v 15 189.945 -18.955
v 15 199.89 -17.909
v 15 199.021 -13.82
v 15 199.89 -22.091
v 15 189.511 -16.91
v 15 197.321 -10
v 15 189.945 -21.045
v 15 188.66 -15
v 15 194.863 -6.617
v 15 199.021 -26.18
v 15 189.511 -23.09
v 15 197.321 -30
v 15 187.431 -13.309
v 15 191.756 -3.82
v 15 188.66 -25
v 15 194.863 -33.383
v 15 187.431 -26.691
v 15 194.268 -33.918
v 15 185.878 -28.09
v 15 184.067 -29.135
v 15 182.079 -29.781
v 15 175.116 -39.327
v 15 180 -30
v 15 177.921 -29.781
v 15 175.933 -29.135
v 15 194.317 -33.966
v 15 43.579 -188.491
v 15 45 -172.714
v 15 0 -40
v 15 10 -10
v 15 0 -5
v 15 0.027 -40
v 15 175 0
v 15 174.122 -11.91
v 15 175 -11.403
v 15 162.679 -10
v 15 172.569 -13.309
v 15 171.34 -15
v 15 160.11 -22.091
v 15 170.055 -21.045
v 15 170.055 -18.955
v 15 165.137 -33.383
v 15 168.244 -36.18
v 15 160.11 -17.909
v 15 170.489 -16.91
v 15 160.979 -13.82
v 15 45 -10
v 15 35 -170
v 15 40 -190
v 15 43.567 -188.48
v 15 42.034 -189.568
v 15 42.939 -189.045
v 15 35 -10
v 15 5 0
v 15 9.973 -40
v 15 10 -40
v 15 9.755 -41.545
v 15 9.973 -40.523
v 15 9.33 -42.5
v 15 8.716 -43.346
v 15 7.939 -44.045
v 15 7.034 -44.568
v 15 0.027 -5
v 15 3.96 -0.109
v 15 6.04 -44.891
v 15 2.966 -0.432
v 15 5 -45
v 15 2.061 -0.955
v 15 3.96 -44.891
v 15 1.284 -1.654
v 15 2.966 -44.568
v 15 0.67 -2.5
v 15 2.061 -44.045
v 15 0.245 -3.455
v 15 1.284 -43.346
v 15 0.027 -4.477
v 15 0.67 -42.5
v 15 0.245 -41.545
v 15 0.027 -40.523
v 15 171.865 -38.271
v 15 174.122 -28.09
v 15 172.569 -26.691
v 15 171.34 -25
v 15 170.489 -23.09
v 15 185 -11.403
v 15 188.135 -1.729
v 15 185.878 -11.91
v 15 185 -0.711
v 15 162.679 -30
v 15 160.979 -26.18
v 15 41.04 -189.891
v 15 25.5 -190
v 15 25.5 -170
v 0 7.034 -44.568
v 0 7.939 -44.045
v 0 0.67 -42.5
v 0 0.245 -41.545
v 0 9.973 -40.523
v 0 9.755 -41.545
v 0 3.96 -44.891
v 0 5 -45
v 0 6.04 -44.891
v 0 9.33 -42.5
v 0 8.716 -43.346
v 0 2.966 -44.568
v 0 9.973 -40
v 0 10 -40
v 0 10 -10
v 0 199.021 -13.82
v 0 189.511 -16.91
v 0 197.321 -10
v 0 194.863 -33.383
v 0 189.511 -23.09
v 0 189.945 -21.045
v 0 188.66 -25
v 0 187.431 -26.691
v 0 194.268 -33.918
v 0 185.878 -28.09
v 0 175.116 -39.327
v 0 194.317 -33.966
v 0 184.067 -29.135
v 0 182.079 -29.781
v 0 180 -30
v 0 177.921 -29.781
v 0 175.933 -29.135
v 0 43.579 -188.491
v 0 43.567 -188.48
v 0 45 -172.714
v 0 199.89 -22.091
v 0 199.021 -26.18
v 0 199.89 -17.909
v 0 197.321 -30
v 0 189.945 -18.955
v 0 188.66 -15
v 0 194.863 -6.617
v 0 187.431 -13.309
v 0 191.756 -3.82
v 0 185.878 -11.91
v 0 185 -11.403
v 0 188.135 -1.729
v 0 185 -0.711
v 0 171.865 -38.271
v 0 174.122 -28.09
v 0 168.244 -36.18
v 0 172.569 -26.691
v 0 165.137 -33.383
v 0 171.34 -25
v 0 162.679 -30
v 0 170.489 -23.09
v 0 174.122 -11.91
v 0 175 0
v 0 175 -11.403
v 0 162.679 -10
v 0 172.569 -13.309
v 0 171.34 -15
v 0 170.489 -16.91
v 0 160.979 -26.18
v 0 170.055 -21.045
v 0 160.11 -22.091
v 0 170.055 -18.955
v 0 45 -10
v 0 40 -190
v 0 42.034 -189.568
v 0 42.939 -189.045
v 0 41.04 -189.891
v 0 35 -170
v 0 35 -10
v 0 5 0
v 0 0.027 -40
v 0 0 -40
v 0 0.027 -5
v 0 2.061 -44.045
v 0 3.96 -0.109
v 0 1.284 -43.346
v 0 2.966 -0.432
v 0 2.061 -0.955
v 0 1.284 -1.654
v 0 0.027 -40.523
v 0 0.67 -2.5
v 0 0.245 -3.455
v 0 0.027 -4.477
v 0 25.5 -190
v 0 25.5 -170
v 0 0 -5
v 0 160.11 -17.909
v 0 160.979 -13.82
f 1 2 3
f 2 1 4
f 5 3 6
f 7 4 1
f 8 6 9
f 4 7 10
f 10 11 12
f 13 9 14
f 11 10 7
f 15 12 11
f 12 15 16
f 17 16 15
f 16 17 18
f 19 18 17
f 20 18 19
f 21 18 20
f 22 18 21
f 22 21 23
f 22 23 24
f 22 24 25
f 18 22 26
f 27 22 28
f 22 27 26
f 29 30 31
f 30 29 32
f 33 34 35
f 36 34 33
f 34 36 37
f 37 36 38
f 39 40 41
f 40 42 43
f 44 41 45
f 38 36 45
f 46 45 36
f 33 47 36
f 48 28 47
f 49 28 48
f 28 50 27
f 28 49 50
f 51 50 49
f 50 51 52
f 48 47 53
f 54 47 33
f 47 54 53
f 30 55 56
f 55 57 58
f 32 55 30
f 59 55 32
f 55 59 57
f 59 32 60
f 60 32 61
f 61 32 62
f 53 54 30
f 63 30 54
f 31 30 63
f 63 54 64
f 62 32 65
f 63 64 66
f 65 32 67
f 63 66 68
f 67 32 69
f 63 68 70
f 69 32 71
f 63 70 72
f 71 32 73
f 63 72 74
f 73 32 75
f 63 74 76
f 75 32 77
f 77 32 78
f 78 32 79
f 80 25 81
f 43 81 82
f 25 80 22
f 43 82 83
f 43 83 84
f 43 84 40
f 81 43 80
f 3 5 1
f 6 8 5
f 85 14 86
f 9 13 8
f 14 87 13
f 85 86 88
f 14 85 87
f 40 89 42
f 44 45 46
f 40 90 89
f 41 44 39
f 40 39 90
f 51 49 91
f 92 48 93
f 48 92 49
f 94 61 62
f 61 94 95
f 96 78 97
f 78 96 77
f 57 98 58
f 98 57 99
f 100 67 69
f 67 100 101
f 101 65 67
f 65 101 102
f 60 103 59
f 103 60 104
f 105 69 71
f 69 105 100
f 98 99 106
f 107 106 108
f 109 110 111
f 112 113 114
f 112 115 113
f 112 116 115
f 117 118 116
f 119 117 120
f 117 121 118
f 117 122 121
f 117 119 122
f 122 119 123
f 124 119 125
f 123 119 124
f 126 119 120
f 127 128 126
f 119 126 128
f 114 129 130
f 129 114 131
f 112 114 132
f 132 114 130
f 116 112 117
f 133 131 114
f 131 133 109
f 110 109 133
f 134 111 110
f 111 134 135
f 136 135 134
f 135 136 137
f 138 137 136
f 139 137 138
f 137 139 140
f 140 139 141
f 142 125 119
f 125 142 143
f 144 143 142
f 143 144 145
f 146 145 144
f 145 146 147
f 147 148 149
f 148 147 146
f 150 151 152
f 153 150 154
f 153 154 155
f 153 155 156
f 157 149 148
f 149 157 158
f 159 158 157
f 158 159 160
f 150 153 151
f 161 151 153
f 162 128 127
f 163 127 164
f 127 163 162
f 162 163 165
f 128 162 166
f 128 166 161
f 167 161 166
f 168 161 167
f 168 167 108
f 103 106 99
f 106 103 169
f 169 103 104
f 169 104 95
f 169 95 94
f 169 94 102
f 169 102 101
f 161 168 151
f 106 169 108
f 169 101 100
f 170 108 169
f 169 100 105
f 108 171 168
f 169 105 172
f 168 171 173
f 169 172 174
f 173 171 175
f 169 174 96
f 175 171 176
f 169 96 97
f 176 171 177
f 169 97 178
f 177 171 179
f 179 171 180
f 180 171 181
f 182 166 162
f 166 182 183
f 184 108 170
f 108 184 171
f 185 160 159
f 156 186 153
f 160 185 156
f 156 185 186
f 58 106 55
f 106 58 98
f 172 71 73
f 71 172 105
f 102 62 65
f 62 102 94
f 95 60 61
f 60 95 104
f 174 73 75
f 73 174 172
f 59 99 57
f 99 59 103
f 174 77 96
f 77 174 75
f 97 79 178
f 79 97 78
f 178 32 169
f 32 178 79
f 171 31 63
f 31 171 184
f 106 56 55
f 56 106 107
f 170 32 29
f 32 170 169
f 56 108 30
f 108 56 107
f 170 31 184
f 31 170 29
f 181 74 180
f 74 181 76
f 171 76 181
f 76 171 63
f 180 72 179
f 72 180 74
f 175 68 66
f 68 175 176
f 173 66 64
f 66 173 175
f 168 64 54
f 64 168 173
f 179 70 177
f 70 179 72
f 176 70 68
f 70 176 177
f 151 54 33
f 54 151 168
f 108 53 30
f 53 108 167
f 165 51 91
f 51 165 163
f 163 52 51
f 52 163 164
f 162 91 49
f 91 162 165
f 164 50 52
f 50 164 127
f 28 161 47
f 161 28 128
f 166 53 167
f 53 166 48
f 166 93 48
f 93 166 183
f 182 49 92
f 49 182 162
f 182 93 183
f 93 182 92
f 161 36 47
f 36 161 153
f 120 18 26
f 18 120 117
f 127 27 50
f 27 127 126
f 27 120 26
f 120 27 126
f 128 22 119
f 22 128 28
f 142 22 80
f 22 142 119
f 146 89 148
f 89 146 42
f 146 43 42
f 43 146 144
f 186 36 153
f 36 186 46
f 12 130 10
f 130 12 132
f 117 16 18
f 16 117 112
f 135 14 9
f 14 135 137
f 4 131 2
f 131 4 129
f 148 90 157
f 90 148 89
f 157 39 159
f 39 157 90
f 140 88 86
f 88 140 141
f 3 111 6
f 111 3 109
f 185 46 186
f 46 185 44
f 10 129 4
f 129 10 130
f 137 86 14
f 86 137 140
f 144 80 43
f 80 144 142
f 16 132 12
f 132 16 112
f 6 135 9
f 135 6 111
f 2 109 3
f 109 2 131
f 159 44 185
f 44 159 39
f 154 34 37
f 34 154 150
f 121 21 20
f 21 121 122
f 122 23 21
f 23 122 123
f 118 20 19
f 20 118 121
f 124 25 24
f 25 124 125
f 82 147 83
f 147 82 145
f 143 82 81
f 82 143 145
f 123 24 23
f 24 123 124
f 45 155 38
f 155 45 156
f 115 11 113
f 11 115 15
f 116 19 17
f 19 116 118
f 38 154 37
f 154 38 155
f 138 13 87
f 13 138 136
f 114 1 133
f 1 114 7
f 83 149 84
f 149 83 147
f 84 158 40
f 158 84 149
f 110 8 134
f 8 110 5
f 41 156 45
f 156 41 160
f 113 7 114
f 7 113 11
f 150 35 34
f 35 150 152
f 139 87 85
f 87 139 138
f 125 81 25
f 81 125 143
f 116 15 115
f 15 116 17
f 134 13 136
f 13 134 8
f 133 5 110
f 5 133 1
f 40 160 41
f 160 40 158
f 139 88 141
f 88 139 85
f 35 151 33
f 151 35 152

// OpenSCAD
/* Customisable hook */

//preview[view:east, tilt:top diagonal]

/* All lengths in millimetres */

// Length of horizontal arm from vertical support to the centre of the holder
arm_length = 140;

// Length of vertical support
support_length = 180;

// Diameter of holder
holder_diameter = 40;

// Cut a section out of the hook?
create_cutout = "Yes"; // [Yes, No]

// Inside measurement along the top of the hook
hook_inside_top_length = 25;

// Inside measurement down the back of the hook
hook_inside_back_length = 25;

// Length of standoff to hold support from wall (set to 0 if not needed)
standoff_length = 9.5;

// Height of standoff
standoff_height = 20;

// Horizontal size - thicker is more sturdy
thickness = 15;

// Bulk - bulkier is more sturdy
bulk = 10;

// Smoothness
smoothness = 30; // [30: Rough, 60: Okay, 120: Good, 180: Very good]
$fn = smoothness;

/* Calculated values */

holder_radius = holder_diameter / 2;

holder_inside_radius = holder_radius - bulk;

hook_top_length = hook_inside_top_length + bulk;
hook_back_length = hook_inside_back_length + bulk;

triangle_length = sqrt(pow(sqrt(pow(arm_length,2)+pow(support_length-(holder_radius- bulk/2),2)),2)-pow((holder_radius- bulk/2),2));

triangle_angle = atan(arm_length/(support_length-(holder_radius- bulk/2)))+ atan((holder_radius-bulk/2)/triangle_length);

create_hook();

module create_hook() {
    translate([0,hook_back_length+bulk/2,0-bulk/2])
        difference() {
            union() {
                back_hook();
                structure();
                holder();
            }
            if (create_cutout == "Yes") {
                cutout();
            }
        }
}

module back_hook() {
    /* Hook */
    /* Back of hook */
    translate([0,0-hook_top_length,0])
        union() {
            translate([0,0,0-hook_back_length])
                rotate([0,90,0])
                    cylinder(h = thickness, r = bulk/2);
            translate([0,0-bulk/2,0-hook_back_length])
                cube([thickness, bulk, hook_back_length]);
        }      
    /* Top of hook */
    translate([0,0-hook_top_length,0])
        union() {
            translate([0,0,0])
                rotate([0,90,0])
                    cylinder(h = thickness, r = bulk/2);
            translate([0,0,0-bulk/2])
                cube([thickness, hook_top_length, bulk]);
        }    
}


module structure() {
    /* Vertical support */
    translate([0,0,0-support_length])
        union() {
            translate([0,0,0])
                rotate([0,90,0])
                    cylinder(h = thickness, r = bulk/2);
            translate([0,0-bulk/2,0])
                cube([thickness, bulk, support_length]);
        }

    /* Standoff */
    translate([0,0-standoff_length-bulk/2,0-support_length-bulk/2])    
        cube([thickness, standoff_length+bulk/2, standoff_height]);

    /* Arm */
    translate([0,0,0-bulk/2])
        cube([thickness, arm_length, bulk]);
        
    /* Triangle */
    translate([0,0,0-support_length])
        rotate([0-triangle_angle,0,0])
            translate([0,0-bulk/2,0])
                cube([thickness, bulk, triangle_length]);    
}

module holder() {
    translate([0,arm_length,0-holder_radius+bulk/2])
        rotate([0,90,0])
            difference() {
                cylinder(h = thickness, r = holder_radius);
                translate([0,0,-1])
                    cylinder(h = thickness+2, r = holder_inside_radius);
            }    
}

module cutout () {
    translate([-1,arm_length-bulk/2,0-bulk])
        cube([thickness+2, bulk, bulk*2]);    
}
